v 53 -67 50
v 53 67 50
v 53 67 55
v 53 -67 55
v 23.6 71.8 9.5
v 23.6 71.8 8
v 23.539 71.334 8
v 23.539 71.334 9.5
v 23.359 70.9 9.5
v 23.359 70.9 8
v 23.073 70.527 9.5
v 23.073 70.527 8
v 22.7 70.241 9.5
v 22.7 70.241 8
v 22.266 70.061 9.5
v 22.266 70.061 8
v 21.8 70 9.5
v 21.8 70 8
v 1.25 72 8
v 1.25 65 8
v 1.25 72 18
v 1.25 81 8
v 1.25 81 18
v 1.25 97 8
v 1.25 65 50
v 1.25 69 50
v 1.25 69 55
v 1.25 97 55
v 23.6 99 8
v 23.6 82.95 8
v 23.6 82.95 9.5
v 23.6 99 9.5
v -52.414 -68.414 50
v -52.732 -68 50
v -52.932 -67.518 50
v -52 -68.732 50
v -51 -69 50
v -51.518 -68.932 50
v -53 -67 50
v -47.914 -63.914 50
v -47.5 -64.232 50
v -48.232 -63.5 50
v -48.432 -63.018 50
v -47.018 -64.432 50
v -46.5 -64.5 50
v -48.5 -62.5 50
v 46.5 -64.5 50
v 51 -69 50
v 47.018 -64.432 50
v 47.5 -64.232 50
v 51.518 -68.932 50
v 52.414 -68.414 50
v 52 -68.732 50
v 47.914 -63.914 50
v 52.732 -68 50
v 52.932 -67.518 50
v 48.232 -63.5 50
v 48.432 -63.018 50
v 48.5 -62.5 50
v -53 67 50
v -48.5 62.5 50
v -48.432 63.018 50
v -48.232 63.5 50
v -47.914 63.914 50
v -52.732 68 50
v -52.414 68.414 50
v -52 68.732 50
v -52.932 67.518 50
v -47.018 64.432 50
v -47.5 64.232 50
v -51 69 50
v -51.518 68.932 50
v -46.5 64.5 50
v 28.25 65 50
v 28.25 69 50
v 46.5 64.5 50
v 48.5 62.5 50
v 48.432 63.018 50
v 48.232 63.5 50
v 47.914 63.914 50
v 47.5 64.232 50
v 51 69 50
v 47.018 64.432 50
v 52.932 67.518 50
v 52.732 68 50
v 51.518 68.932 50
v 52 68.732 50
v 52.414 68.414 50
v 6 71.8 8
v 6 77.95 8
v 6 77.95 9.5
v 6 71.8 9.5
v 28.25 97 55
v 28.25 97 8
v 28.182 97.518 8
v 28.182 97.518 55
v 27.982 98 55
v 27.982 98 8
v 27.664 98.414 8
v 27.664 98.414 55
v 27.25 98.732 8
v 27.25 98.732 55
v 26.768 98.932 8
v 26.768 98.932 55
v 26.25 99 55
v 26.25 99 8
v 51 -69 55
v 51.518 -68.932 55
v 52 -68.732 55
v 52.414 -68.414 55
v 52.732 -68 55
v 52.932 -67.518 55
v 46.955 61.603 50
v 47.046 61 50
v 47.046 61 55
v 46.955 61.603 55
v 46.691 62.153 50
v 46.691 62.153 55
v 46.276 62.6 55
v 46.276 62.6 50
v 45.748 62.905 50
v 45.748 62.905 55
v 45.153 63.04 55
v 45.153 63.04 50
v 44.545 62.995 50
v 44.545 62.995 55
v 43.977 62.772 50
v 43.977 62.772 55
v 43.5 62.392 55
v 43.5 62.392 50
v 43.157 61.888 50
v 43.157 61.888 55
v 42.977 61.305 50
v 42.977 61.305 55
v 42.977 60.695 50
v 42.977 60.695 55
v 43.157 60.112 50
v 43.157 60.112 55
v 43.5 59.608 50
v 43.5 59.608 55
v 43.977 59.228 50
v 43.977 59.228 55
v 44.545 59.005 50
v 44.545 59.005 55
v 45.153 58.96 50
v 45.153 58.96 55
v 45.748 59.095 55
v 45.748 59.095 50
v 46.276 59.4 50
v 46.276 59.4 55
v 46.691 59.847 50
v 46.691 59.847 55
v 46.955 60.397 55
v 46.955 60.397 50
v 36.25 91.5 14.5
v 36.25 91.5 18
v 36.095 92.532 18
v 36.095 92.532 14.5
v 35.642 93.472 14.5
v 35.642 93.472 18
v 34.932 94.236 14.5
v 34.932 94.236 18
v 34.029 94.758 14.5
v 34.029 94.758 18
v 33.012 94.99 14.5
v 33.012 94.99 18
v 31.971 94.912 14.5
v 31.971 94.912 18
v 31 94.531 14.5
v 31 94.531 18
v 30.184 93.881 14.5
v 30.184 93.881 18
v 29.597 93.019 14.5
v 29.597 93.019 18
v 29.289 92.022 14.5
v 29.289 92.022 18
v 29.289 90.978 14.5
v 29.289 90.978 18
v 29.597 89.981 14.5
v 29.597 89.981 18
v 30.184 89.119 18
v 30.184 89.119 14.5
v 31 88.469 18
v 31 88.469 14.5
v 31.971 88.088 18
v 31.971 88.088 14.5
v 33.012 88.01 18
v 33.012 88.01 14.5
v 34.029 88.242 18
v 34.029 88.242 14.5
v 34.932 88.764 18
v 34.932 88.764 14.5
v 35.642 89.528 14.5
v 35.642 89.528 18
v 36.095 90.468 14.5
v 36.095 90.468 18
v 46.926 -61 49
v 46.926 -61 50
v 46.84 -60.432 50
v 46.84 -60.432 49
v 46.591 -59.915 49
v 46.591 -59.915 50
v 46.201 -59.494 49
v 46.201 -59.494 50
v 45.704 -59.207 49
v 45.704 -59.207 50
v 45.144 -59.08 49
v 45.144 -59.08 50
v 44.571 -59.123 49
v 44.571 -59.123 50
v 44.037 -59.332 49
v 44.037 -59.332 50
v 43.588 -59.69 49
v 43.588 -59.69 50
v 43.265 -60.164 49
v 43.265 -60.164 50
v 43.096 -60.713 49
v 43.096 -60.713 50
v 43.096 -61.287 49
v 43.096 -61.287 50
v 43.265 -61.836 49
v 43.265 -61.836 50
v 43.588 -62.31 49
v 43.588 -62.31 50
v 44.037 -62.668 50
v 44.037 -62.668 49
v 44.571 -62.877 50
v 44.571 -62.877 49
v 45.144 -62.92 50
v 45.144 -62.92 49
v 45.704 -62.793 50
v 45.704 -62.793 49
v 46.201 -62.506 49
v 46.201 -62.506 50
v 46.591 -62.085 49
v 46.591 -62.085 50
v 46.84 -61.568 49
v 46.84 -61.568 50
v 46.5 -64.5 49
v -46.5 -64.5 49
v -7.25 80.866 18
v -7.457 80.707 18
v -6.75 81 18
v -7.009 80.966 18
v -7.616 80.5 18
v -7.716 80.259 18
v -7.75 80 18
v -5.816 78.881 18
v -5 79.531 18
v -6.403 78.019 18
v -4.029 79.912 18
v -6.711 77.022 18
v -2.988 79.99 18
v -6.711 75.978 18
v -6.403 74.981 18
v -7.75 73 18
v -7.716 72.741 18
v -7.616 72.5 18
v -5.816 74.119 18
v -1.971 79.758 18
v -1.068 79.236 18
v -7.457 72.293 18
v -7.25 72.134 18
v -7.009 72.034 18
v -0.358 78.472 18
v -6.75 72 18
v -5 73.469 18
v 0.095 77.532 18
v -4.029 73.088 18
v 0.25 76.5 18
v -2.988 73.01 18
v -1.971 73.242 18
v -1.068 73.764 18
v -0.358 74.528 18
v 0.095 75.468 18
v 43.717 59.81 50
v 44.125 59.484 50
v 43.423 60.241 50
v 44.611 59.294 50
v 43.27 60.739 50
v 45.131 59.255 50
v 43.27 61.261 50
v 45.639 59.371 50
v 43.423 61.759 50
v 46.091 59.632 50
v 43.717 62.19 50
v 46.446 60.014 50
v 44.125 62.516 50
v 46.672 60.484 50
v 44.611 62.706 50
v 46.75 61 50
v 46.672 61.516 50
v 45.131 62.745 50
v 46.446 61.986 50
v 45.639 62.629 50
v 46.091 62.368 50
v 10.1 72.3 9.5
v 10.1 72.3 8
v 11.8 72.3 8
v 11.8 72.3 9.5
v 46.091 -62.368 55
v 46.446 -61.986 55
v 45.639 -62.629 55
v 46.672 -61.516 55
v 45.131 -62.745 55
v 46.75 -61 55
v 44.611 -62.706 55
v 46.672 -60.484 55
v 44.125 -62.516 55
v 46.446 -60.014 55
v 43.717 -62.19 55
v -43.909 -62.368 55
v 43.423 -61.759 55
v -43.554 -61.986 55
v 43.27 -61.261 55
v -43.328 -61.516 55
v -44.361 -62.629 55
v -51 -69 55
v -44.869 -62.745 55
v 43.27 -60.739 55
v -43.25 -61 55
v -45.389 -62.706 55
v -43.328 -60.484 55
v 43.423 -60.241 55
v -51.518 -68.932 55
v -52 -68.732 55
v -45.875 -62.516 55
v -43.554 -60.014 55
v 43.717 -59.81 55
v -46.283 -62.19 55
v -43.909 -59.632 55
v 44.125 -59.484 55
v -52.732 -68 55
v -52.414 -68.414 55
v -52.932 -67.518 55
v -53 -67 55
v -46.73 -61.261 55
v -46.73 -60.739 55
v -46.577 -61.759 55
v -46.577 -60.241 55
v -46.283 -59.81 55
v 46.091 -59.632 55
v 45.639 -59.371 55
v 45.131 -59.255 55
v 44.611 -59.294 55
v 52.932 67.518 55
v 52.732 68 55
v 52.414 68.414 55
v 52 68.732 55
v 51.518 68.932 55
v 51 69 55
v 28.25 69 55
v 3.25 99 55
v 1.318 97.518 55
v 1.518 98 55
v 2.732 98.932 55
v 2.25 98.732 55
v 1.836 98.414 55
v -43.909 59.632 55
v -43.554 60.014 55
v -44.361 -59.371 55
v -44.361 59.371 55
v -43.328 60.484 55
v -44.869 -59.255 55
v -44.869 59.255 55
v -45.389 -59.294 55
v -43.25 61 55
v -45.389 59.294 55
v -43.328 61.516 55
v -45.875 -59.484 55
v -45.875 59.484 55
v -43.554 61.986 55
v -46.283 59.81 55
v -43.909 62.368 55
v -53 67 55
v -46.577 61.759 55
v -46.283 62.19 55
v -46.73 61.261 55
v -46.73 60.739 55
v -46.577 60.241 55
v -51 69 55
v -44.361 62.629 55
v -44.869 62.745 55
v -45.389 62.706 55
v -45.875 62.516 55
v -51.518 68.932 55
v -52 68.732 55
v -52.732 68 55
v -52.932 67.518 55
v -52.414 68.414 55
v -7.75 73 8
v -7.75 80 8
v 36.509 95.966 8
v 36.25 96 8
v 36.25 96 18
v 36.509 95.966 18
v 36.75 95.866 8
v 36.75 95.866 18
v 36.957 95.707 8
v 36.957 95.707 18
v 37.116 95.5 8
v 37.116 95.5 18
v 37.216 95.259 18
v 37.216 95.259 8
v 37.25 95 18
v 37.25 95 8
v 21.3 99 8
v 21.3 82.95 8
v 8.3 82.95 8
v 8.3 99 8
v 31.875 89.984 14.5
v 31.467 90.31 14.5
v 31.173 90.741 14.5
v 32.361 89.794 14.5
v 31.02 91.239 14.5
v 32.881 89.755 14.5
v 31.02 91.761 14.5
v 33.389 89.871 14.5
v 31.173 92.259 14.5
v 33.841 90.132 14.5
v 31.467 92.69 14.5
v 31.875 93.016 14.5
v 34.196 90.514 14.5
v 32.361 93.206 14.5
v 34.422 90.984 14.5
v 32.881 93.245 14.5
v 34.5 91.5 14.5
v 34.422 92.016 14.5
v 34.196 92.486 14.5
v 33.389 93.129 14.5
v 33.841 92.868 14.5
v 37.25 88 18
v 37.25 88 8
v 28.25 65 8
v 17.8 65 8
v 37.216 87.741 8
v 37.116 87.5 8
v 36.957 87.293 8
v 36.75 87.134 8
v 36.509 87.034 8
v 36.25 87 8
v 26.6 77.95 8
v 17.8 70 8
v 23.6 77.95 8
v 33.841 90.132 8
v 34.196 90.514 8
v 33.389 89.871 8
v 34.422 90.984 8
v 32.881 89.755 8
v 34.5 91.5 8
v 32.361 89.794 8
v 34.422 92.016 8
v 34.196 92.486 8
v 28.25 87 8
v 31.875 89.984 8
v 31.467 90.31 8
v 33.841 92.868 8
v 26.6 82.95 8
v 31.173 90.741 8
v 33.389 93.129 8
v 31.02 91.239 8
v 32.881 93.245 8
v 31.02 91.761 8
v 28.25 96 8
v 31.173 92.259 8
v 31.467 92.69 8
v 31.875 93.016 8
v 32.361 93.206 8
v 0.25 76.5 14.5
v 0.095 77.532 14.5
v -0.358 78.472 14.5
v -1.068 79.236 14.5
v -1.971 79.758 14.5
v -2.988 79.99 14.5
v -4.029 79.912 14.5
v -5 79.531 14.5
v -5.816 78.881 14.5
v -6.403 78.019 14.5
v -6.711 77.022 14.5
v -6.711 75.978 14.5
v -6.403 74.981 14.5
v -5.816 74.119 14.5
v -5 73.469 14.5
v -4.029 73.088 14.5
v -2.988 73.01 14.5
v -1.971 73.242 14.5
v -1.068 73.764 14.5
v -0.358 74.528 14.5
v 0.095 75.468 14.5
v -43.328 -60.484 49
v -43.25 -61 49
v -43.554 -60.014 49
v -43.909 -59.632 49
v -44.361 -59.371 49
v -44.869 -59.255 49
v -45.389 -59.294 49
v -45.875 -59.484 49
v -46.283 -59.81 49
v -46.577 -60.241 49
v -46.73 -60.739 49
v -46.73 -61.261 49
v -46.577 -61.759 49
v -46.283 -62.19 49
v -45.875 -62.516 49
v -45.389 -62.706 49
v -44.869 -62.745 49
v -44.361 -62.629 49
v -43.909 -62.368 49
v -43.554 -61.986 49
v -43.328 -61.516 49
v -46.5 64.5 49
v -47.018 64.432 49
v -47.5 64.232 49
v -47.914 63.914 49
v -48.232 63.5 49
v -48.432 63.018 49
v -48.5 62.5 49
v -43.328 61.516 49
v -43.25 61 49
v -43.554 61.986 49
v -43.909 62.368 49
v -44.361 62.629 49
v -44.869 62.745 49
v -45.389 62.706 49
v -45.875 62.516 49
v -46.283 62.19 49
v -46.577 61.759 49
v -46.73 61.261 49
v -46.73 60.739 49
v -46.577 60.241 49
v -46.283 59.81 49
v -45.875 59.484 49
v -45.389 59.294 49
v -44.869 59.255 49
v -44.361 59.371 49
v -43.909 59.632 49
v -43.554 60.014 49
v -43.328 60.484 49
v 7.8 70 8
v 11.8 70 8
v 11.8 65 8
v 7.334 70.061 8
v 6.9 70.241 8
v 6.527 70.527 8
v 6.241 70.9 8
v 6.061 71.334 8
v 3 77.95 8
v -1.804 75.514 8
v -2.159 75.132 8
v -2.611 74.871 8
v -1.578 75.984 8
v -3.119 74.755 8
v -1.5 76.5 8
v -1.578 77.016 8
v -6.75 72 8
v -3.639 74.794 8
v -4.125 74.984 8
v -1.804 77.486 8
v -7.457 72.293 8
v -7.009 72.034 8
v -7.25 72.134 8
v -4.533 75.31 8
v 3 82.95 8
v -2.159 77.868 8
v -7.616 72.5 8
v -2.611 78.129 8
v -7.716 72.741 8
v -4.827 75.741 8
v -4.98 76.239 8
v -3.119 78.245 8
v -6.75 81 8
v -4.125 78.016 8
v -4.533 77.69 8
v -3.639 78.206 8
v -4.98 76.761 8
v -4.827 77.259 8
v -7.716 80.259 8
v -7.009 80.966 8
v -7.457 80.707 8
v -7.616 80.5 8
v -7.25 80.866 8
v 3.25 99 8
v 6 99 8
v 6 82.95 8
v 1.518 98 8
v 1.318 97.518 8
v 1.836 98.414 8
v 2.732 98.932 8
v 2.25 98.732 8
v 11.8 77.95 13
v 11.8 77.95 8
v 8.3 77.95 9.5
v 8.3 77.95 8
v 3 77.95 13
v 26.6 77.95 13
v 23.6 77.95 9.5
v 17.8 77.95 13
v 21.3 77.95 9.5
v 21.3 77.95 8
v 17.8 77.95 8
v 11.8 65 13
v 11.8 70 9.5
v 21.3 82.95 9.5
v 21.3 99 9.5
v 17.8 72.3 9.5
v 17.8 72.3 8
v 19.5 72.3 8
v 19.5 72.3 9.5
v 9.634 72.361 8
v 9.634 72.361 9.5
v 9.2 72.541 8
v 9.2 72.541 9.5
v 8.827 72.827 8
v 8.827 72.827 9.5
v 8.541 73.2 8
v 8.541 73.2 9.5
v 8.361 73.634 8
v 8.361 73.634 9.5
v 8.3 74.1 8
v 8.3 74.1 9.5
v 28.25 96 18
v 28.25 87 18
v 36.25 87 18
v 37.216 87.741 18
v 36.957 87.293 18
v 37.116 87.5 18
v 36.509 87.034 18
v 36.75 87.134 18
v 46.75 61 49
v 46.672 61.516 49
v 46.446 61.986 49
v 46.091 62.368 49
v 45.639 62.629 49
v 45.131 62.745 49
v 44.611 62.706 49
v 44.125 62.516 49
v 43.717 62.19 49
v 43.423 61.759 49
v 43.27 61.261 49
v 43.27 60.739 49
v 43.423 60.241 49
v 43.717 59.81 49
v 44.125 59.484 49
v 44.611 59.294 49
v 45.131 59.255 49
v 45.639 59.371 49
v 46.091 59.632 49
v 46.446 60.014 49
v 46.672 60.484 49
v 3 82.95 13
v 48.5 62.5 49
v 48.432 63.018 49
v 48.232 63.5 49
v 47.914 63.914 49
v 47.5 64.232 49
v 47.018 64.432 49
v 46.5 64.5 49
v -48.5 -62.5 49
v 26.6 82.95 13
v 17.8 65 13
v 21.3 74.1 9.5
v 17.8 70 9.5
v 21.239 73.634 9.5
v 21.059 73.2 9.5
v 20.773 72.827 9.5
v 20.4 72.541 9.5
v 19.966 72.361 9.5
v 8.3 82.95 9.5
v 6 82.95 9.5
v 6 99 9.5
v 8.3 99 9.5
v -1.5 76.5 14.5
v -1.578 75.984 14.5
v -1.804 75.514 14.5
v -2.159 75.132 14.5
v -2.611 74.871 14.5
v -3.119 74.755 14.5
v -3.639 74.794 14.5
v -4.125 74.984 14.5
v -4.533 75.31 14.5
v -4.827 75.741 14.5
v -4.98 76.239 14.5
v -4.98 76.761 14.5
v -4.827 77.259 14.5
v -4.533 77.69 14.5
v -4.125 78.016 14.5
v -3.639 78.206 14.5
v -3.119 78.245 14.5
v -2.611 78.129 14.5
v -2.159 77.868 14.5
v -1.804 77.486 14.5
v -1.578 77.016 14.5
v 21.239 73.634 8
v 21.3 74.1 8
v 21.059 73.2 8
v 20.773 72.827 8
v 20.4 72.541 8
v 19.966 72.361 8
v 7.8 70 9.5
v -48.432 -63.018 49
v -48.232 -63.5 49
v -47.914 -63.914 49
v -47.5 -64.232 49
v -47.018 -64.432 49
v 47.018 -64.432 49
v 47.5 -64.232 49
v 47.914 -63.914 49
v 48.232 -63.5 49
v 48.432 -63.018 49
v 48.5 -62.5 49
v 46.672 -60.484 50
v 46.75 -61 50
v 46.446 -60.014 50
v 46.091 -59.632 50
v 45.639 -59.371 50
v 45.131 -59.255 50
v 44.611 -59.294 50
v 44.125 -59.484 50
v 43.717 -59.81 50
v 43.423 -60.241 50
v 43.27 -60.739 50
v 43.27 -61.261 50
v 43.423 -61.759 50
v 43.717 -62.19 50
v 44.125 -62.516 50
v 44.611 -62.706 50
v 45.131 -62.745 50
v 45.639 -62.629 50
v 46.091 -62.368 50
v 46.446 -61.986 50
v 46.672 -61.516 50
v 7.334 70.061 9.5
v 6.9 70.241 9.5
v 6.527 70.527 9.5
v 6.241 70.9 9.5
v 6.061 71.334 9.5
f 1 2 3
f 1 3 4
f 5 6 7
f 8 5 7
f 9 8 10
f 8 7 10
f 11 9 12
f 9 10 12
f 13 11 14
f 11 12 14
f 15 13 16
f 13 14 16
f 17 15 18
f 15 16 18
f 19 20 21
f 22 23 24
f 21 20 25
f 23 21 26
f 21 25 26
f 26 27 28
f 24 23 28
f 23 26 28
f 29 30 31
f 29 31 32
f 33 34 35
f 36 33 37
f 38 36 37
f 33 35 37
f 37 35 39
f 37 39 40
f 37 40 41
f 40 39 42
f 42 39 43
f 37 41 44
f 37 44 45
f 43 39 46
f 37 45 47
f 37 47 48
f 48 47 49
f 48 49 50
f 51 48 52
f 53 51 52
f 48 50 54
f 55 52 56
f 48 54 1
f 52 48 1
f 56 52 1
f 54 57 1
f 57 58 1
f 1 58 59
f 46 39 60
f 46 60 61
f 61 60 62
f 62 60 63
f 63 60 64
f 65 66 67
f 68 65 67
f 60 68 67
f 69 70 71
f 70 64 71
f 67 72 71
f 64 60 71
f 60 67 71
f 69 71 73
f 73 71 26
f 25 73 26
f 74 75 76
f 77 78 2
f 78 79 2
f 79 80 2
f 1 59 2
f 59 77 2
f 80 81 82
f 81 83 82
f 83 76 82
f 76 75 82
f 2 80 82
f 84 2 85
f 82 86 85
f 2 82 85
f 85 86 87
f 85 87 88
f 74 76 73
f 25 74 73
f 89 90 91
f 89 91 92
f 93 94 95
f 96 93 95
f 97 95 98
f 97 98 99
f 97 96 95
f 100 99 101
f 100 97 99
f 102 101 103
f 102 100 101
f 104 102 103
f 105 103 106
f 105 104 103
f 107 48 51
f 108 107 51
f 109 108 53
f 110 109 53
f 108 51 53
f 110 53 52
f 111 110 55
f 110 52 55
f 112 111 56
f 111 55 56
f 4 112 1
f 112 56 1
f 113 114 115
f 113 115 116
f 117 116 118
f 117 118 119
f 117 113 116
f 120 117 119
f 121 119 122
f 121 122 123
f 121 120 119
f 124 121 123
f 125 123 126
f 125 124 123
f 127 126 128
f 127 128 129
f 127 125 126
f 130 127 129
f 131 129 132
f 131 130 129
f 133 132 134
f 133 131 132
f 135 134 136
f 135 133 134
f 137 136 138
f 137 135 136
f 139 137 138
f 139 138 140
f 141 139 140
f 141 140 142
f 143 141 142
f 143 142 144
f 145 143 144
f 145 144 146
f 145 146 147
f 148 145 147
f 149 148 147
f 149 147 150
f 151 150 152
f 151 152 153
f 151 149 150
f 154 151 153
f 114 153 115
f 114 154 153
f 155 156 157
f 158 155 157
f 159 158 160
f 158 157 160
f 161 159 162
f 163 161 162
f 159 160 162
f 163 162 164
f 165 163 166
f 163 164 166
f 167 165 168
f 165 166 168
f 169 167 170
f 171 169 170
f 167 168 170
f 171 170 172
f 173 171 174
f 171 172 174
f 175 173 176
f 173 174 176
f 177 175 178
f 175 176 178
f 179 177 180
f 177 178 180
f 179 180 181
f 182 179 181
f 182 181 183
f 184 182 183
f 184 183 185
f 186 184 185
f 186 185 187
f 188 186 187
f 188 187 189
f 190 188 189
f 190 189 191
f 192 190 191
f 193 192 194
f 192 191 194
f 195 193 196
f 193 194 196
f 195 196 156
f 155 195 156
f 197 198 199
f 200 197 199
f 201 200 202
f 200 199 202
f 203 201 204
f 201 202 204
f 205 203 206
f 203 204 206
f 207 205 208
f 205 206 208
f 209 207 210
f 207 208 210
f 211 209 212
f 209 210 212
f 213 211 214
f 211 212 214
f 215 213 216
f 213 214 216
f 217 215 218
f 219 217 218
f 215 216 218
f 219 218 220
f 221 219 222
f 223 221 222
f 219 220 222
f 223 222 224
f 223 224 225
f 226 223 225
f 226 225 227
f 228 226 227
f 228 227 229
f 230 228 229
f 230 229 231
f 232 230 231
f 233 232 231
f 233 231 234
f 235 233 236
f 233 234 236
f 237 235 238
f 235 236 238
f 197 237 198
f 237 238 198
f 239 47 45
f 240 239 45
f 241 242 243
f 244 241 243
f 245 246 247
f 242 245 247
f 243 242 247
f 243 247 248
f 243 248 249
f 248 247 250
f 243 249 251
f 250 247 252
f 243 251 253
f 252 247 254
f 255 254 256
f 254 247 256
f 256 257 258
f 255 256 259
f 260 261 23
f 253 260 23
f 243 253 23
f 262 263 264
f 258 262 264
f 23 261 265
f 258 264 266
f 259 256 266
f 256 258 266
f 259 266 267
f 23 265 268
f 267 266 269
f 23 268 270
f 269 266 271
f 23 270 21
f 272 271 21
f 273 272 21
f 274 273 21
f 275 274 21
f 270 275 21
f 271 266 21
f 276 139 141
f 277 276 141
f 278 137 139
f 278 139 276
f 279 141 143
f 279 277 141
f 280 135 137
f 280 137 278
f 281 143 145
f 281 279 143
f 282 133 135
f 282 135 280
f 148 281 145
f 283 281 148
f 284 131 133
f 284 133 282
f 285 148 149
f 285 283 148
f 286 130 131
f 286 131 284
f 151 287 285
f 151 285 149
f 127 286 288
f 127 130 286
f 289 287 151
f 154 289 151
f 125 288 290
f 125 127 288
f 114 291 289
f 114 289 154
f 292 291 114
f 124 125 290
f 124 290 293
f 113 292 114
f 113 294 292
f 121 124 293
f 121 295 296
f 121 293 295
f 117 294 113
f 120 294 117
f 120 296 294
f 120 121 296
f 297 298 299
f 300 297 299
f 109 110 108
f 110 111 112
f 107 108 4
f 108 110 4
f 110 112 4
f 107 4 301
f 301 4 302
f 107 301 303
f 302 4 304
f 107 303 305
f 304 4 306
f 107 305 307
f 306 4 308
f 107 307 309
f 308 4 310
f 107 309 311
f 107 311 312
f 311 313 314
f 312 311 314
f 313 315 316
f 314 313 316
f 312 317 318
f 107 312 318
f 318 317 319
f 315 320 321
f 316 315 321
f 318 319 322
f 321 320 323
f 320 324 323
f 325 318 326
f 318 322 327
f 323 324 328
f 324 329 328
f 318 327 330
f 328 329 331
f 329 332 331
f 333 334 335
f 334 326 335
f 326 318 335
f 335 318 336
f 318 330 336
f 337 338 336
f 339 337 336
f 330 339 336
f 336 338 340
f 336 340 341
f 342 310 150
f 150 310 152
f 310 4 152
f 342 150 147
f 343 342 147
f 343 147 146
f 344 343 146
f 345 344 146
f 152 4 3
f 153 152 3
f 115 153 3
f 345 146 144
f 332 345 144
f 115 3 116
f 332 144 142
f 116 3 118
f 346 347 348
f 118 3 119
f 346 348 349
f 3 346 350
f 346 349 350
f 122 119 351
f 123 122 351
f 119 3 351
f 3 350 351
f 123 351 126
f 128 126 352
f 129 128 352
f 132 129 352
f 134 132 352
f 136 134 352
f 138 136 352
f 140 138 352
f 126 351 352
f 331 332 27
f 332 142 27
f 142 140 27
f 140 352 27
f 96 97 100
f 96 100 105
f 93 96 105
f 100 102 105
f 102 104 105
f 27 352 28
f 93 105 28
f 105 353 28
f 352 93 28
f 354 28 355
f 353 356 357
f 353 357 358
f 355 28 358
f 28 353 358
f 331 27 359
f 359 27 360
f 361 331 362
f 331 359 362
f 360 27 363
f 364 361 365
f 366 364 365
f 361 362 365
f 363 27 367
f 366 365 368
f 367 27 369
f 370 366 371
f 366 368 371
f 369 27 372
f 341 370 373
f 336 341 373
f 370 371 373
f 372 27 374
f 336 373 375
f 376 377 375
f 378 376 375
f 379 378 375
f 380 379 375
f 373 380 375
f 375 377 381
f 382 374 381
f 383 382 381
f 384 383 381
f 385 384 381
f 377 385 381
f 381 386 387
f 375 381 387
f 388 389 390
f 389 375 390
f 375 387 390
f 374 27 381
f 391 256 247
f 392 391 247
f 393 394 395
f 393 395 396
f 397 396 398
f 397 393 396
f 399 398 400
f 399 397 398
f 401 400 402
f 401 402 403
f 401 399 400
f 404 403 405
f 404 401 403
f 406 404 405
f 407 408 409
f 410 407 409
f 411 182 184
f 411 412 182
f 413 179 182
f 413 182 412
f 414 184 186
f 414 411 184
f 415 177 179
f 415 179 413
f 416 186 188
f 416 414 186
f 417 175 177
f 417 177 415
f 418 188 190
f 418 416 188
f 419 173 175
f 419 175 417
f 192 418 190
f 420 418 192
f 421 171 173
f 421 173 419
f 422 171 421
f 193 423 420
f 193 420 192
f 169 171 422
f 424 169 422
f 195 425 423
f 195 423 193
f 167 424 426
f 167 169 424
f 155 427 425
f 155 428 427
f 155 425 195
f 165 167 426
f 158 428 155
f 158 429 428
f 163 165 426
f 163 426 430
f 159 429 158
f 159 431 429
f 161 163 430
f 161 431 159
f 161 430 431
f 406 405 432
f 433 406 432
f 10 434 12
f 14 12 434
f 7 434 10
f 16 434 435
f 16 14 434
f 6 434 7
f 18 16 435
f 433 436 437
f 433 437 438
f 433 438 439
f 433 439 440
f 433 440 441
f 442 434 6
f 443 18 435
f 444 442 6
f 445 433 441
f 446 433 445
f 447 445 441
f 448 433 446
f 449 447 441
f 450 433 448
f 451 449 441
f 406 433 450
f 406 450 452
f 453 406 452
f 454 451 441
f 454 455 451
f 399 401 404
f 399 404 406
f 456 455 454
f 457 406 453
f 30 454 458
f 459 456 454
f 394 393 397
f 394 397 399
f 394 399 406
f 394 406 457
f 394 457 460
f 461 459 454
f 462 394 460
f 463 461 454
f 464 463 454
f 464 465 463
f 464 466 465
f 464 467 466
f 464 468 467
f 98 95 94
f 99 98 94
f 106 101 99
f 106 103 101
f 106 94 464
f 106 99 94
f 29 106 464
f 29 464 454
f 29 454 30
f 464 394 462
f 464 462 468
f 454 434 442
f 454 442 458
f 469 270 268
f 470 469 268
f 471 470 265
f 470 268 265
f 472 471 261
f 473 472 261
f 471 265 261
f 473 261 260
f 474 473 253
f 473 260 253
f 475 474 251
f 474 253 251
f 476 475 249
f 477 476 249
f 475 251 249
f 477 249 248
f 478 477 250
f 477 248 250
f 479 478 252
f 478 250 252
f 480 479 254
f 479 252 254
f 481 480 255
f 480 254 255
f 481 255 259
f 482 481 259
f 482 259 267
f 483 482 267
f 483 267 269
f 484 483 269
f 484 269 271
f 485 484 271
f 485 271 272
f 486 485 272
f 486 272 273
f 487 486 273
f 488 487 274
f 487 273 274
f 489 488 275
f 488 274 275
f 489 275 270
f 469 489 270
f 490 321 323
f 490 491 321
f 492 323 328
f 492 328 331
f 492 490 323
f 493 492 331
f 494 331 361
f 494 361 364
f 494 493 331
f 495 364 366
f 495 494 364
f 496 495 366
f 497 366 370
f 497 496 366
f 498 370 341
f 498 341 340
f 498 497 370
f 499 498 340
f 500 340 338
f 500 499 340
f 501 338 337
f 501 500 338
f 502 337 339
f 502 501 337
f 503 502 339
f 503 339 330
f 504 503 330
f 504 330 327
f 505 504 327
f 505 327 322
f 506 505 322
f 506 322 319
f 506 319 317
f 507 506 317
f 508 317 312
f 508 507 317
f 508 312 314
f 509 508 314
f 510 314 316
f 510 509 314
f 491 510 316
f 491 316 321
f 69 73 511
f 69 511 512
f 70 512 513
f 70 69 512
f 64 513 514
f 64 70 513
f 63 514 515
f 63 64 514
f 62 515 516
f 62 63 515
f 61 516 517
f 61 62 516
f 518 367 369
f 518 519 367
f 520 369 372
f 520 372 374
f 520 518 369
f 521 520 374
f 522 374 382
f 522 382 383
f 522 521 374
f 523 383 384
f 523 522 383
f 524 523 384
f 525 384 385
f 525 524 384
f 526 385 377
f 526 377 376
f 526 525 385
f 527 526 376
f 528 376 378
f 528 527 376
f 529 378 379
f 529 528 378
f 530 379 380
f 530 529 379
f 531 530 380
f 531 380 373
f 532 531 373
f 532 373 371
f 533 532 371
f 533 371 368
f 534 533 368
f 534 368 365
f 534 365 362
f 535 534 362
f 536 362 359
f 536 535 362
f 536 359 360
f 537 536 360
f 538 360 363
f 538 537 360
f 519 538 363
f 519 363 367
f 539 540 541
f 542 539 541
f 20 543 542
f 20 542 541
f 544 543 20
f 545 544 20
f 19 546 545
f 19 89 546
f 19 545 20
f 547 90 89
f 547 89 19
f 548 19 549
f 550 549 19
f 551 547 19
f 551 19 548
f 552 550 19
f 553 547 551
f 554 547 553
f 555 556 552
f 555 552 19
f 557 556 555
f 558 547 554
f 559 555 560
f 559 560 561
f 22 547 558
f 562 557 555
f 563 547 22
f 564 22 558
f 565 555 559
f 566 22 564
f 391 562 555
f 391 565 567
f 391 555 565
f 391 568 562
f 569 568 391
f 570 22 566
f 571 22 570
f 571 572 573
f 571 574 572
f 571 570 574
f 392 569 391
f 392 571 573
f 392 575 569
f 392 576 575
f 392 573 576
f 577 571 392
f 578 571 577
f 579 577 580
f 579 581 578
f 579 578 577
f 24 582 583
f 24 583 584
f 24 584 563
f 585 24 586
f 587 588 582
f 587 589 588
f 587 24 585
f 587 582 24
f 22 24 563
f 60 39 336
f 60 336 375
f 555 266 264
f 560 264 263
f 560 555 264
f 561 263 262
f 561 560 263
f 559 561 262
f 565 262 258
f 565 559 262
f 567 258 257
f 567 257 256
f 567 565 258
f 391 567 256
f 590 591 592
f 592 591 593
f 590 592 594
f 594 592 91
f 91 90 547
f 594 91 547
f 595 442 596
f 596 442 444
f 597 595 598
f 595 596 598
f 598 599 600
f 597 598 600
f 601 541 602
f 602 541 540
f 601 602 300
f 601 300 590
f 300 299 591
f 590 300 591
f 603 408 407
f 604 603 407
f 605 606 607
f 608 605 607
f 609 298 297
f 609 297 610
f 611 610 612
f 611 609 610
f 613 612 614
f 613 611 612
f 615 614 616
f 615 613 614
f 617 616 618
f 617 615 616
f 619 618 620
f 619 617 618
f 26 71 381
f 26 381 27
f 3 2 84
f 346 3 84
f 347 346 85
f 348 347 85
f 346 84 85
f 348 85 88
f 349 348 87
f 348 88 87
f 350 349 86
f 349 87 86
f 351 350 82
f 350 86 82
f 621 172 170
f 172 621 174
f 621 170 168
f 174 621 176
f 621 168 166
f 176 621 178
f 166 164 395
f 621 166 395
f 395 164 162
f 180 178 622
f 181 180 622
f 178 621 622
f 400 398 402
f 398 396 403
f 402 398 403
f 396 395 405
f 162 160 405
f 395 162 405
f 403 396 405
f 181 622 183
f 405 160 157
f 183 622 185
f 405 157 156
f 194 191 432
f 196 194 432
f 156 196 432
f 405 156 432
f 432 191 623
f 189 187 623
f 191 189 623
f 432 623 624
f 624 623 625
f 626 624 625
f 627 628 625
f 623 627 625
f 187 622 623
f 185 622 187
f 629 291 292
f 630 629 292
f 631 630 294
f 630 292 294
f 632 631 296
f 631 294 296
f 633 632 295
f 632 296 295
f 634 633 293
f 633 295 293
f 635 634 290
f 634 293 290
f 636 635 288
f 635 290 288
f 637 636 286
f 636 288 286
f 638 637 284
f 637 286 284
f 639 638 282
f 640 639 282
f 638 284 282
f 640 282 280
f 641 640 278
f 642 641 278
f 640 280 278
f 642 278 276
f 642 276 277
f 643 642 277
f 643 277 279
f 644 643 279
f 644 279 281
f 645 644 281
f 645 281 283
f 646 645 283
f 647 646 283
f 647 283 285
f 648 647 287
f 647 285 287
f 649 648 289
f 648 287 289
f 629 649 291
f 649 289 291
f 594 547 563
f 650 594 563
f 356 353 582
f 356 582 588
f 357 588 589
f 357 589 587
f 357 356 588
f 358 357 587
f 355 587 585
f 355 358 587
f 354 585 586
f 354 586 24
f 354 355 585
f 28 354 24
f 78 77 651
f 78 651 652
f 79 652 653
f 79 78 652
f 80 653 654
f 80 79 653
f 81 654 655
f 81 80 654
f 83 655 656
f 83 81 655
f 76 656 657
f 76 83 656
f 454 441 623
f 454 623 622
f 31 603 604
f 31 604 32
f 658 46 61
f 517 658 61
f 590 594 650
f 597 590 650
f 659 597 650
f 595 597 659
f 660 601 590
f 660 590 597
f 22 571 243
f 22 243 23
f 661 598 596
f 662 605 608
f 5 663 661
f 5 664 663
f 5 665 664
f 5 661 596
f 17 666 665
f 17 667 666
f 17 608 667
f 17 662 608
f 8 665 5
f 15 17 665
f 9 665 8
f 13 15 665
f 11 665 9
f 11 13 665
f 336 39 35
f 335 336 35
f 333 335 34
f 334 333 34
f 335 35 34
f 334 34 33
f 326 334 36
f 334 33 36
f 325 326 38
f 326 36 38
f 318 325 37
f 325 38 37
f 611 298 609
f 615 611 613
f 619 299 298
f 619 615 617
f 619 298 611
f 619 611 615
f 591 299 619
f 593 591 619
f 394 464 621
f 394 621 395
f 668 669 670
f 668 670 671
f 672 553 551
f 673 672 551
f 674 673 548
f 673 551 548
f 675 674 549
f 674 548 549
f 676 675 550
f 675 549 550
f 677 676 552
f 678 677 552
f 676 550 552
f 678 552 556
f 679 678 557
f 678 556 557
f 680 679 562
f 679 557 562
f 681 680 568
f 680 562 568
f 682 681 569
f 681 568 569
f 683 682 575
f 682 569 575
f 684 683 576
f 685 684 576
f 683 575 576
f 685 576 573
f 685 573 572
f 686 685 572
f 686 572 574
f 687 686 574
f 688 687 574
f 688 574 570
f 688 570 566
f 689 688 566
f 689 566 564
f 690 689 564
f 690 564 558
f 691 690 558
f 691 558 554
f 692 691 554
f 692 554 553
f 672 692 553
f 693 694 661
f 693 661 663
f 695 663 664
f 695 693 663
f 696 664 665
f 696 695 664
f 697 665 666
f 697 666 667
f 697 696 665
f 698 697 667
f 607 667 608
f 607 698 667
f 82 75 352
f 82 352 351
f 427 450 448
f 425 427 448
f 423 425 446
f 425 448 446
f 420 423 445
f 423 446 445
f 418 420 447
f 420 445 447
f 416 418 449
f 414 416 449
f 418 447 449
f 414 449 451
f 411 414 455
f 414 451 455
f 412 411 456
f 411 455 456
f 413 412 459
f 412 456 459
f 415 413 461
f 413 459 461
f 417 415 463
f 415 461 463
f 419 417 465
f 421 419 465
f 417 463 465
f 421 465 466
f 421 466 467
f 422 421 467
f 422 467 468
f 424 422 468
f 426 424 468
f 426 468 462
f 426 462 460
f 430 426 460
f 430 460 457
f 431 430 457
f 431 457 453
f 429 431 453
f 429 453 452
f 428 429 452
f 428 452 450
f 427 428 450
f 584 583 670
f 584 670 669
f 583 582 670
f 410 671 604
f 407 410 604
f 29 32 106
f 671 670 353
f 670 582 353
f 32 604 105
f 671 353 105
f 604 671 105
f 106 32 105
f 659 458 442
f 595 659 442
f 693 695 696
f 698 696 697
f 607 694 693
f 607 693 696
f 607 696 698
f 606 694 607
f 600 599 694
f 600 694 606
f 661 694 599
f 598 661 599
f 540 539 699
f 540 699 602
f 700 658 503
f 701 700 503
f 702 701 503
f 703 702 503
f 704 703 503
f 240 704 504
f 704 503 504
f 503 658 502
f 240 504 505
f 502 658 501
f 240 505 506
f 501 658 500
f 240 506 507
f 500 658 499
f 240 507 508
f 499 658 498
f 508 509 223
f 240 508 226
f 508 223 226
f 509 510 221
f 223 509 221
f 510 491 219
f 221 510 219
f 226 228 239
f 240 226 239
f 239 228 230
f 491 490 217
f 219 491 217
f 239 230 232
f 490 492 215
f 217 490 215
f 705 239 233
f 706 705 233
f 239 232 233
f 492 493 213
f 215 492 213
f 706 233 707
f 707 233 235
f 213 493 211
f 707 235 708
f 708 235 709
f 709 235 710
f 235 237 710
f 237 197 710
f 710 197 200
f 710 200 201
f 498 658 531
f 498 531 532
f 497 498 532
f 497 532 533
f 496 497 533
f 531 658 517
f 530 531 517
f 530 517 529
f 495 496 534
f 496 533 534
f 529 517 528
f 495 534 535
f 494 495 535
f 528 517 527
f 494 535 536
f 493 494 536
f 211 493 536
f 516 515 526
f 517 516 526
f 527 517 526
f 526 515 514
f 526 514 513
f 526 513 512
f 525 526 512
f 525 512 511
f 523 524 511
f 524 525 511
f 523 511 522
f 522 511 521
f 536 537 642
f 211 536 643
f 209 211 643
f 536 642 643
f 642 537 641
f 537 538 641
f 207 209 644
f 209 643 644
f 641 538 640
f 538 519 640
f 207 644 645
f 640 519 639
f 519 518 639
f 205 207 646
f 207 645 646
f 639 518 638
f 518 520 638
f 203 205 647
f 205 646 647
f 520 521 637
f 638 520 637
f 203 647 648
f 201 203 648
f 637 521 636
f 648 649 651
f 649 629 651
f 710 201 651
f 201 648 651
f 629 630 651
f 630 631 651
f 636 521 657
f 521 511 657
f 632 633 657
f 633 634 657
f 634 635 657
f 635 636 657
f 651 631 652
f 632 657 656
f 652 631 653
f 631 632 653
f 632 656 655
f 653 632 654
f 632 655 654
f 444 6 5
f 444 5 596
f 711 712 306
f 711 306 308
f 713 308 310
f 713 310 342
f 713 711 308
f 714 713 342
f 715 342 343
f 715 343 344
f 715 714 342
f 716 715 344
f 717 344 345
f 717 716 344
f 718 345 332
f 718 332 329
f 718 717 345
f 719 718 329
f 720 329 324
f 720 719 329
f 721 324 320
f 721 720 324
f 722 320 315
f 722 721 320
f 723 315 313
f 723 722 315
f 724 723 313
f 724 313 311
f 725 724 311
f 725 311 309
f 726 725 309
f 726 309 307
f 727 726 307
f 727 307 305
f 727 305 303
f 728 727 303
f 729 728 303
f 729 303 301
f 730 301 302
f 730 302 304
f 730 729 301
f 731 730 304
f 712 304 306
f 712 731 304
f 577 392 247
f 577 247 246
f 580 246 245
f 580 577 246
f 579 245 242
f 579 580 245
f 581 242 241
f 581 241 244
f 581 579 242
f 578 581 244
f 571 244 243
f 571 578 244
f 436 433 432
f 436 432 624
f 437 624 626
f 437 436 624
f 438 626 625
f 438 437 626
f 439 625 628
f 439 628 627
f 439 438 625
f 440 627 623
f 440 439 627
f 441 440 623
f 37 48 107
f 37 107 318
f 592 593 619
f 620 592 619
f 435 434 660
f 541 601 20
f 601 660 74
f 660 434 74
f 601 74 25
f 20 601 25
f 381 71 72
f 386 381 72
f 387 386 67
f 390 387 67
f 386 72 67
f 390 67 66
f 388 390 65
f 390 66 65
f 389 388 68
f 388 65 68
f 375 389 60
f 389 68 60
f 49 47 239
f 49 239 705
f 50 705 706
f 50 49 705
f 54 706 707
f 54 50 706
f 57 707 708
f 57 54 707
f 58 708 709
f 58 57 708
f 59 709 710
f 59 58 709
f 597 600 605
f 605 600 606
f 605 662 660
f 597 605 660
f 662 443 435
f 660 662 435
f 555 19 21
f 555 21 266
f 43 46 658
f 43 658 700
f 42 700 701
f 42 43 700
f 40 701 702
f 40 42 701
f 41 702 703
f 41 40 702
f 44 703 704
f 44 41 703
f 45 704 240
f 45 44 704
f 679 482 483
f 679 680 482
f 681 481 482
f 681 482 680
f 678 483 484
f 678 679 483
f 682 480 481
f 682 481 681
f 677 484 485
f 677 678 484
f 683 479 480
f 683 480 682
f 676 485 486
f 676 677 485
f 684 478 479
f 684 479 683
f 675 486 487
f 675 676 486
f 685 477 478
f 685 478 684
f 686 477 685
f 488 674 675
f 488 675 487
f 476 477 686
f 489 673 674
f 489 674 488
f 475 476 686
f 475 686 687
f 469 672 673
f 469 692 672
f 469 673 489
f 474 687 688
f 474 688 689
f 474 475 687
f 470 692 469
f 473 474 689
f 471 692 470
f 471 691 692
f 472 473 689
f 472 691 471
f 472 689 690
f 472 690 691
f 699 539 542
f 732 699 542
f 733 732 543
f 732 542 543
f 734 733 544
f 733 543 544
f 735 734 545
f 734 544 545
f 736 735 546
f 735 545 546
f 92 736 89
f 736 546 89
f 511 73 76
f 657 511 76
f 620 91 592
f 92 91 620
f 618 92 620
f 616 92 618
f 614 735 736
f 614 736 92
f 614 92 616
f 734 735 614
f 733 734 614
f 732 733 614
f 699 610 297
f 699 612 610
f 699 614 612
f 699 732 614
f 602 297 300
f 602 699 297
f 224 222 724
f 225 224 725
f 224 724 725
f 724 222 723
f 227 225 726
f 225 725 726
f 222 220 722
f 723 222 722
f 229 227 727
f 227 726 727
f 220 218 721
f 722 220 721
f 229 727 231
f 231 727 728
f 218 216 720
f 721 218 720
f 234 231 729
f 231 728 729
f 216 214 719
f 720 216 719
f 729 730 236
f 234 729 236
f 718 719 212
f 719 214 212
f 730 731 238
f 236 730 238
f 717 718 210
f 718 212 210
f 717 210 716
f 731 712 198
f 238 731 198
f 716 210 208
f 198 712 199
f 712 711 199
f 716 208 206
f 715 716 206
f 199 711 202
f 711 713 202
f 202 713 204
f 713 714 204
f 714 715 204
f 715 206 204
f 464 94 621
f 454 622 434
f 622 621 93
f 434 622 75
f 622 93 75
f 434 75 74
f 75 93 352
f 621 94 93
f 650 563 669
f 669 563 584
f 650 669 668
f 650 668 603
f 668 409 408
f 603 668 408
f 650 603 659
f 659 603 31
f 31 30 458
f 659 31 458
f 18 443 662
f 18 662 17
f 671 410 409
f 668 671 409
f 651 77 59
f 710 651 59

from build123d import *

# Parameters (mm, degrees)
SKETCH020_R     = 1.75
SKETCH020_R_2   = 2.04611
PAD008_DEPTH    = 5
SKETCH021_R     = 1.75
SKETCH021_R_2   = 1.925729
PAD009_DEPTH    = 1
PAD010_DEPTH    = 47
POCKET010_DEPTH = 1.5
POCKET011_DEPTH = 5
SKETCH025_R     = 1.75
PAD011_DEPTH    = 10
SKETCH026_R     = 3.5
POCKET012_DEPTH = 3.5


with BuildPart() as part:
    # Sketch020 (on Face1 of ShapeBinder) → Pad008 (new body)
    with BuildSketch(Plane.XY.offset(50)):
        with BuildLine():
            ThreePointArc((-51, 69), (-52.414214, 68.414214), (-53, 67))
            Line((-53, -67), (-53, 67))
            ThreePointArc((-53, -67), (-52.414214, -68.414214), (-51, -69))
            Line((51, -69), (-51, -69))
            ThreePointArc((51, -69), (52.414214, -68.414214), (53, -67))
            Line((53, 67), (53, -67))
            ThreePointArc((53, 67), (52.414214, 68.414214), (51, 69))
            Line((-51, 69), (51, 69))
        make_face()
        with Locations((-45, -61)):
            Circle(SKETCH020_R, mode=Mode.SUBTRACT)
        with Locations((45, -61)):
            Circle(SKETCH020_R, mode=Mode.SUBTRACT)
        with Locations((-45, 61)):
            Circle(SKETCH020_R, mode=Mode.SUBTRACT)
        with Locations((45, 61)):
            Circle(SKETCH020_R_2, mode=Mode.SUBTRACT)
    extrude(amount=PAD008_DEPTH)

    # Sketch021 (on Face1 of ShapeBinder) → Pad009 (join)
    with BuildSketch(Plane.XY.offset(50)):
        with BuildLine():
            ThreePointArc((-46.5, 64.5), (-47.914214, 63.914214), (-48.5, 62.5))
            Line((-48.5, -62.5), (-48.5, 62.5))
            ThreePointArc((-48.5, -62.5), (-47.914214, -63.914214), (-46.5, -64.5))
            Line((46.5, -64.5), (-46.5, -64.5))
            ThreePointArc((46.5, -64.5), (47.914214, -63.914214), (48.5, -62.5))
            Line((48.5, 62.5), (48.5, -62.5))
            ThreePointArc((48.5, 62.5), (47.914214, 63.914214), (46.5, 64.5))
            Line((-46.5, 64.5), (46.5, 64.5))
        make_face()
        with Locations((-45, -61)):
            Circle(SKETCH021_R, mode=Mode.SUBTRACT)
        with Locations((45, -61)):
            Circle(SKETCH021_R_2, mode=Mode.SUBTRACT)
        with Locations((-45, 61)):
            Circle(SKETCH021_R, mode=Mode.SUBTRACT)
        with Locations((45, 61)):
            Circle(SKETCH021_R, mode=Mode.SUBTRACT)
    extrude(amount=-PAD009_DEPTH)

    # Sketch022 (on Face14 of Pad008) → Pad010 (join)
    with BuildSketch(Plane.XY.offset(55)):
        with BuildLine():
            Line((3.25, 99), (26.25, 99))
            ThreePointArc((28.25, 97), (27.664214, 98.414214), (26.25, 99))
            Line((28.25, 97), (28.25, 65))
            Line((28.25, 65), (1.25, 65))
            Line((1.25, 65), (1.25, 97))
            ThreePointArc((3.25, 99), (1.835786, 98.414214), (1.25, 97))
        make_face()
    extrude(amount=-PAD010_DEPTH)

    # Sketch023 (on Face30 of Pad010) → Pocket010 (cut)
    with BuildSketch(Plane(origin=(0, 0, 8), x_dir=(1, 0, 0), z_dir=(0, 0, -1))):
        with BuildLine():
            ThreePointArc((7.8, -70), (6.527208, -70.527208), (6, -71.8))
            Line((6, -123.151319), (6, -71.8))
            ThreePointArc((6, -123.151319), (6.527208, -124.424111), (7.8, -124.951319))
            Line((21.8, -124.951319), (7.8, -124.951319))
            ThreePointArc((21.8, -124.951319), (23.072792, -124.424111), (23.6, -123.151319))
            Line((23.6, -71.8), (23.6, -123.151319))
            ThreePointArc((23.6, -71.8), (23.072792, -70.527208), (21.8, -70))
            Line((7.8, -70), (21.8, -70))
        make_face()
        with BuildLine():
            ThreePointArc((10.1, -72.3), (8.827208, -72.827208), (8.3, -74.1))
            Line((8.3, -119.625365), (8.3, -74.1))
            ThreePointArc((8.3, -119.625365), (8.827208, -120.898157), (10.1, -121.425365))
            Line((19.5, -121.425365), (10.1, -121.425365))
            ThreePointArc((19.5, -121.425365), (20.772792, -120.898157), (21.3, -119.625365))
            Line((21.3, -74.1), (21.3, -119.625365))
            ThreePointArc((21.3, -74.1), (20.772792, -72.827208), (19.5, -72.3))
            Line((10.1, -72.3), (19.5, -72.3))
        make_face(mode=Mode.SUBTRACT)
    extrude(amount=-POCKET010_DEPTH, mode=Mode.SUBTRACT)

    # Sketch024 (on Face30 of Pad010) → Pocket011 (cut)
    with BuildSketch(Plane(origin=(0, 0, 8), x_dir=(1, 0, 0), z_dir=(0, 0, -1))):
        Polygon((17.8, -65), (11.8, -65), (11.8, -77.95), (3, -77.95), (3, -82.95), (26.6, -82.95), (26.6, -77.95), (17.8, -77.95), align=None)
    extrude(amount=-POCKET011_DEPTH, mode=Mode.SUBTRACT)

    # Sketch025 (on Face30 of Pad010) → Pad011 (join)
    with BuildSketch(Plane(origin=(0, 0, 8), x_dir=(1, 0, 0), z_dir=(0, 0, -1))):
        with BuildLine():
            Line((-7.75, -73), (-7.75, -80))
            ThreePointArc((-7.75, -80), (-7.457107, -80.707107), (-6.75, -81))
            Line((-6.75, -81), (1.25, -81))
            Line((1.25, -81), (1.25, -72))
            Line((1.25, -72), (-6.75, -72))
            ThreePointArc((-6.75, -72), (-7.457107, -72.292893), (-7.75, -73))
        make_face()
        with Locations((-3.25, -76.5)):
            Circle(SKETCH025_R, mode=Mode.SUBTRACT)
        with BuildLine():
            Line((36.25, -87), (28.25, -87))
            Line((28.25, -87), (28.25, -96))
            Line((28.25, -96), (36.25, -96))
            ThreePointArc((36.25, -96), (36.957107, -95.707107), (37.25, -95))
            Line((37.25, -95), (37.25, -88))
            ThreePointArc((37.25, -88), (36.957107, -87.292893), (36.25, -87))
        make_face()
        with Locations((32.75, -91.5)):
            Circle(SKETCH025_R, mode=Mode.SUBTRACT)
    extrude(amount=-PAD011_DEPTH)

    # Sketch026 (on Face32 of Pad011) → Pocket012 (cut)
    with BuildSketch(Plane.XY.offset(18)):
        with Locations((-3.25, 76.5)):
            Circle(SKETCH026_R)
        with Locations((32.75, 91.5)):
            Circle(SKETCH026_R)
    extrude(amount=-POCKET012_DEPTH, mode=Mode.SUBTRACT)


solid = part.part
